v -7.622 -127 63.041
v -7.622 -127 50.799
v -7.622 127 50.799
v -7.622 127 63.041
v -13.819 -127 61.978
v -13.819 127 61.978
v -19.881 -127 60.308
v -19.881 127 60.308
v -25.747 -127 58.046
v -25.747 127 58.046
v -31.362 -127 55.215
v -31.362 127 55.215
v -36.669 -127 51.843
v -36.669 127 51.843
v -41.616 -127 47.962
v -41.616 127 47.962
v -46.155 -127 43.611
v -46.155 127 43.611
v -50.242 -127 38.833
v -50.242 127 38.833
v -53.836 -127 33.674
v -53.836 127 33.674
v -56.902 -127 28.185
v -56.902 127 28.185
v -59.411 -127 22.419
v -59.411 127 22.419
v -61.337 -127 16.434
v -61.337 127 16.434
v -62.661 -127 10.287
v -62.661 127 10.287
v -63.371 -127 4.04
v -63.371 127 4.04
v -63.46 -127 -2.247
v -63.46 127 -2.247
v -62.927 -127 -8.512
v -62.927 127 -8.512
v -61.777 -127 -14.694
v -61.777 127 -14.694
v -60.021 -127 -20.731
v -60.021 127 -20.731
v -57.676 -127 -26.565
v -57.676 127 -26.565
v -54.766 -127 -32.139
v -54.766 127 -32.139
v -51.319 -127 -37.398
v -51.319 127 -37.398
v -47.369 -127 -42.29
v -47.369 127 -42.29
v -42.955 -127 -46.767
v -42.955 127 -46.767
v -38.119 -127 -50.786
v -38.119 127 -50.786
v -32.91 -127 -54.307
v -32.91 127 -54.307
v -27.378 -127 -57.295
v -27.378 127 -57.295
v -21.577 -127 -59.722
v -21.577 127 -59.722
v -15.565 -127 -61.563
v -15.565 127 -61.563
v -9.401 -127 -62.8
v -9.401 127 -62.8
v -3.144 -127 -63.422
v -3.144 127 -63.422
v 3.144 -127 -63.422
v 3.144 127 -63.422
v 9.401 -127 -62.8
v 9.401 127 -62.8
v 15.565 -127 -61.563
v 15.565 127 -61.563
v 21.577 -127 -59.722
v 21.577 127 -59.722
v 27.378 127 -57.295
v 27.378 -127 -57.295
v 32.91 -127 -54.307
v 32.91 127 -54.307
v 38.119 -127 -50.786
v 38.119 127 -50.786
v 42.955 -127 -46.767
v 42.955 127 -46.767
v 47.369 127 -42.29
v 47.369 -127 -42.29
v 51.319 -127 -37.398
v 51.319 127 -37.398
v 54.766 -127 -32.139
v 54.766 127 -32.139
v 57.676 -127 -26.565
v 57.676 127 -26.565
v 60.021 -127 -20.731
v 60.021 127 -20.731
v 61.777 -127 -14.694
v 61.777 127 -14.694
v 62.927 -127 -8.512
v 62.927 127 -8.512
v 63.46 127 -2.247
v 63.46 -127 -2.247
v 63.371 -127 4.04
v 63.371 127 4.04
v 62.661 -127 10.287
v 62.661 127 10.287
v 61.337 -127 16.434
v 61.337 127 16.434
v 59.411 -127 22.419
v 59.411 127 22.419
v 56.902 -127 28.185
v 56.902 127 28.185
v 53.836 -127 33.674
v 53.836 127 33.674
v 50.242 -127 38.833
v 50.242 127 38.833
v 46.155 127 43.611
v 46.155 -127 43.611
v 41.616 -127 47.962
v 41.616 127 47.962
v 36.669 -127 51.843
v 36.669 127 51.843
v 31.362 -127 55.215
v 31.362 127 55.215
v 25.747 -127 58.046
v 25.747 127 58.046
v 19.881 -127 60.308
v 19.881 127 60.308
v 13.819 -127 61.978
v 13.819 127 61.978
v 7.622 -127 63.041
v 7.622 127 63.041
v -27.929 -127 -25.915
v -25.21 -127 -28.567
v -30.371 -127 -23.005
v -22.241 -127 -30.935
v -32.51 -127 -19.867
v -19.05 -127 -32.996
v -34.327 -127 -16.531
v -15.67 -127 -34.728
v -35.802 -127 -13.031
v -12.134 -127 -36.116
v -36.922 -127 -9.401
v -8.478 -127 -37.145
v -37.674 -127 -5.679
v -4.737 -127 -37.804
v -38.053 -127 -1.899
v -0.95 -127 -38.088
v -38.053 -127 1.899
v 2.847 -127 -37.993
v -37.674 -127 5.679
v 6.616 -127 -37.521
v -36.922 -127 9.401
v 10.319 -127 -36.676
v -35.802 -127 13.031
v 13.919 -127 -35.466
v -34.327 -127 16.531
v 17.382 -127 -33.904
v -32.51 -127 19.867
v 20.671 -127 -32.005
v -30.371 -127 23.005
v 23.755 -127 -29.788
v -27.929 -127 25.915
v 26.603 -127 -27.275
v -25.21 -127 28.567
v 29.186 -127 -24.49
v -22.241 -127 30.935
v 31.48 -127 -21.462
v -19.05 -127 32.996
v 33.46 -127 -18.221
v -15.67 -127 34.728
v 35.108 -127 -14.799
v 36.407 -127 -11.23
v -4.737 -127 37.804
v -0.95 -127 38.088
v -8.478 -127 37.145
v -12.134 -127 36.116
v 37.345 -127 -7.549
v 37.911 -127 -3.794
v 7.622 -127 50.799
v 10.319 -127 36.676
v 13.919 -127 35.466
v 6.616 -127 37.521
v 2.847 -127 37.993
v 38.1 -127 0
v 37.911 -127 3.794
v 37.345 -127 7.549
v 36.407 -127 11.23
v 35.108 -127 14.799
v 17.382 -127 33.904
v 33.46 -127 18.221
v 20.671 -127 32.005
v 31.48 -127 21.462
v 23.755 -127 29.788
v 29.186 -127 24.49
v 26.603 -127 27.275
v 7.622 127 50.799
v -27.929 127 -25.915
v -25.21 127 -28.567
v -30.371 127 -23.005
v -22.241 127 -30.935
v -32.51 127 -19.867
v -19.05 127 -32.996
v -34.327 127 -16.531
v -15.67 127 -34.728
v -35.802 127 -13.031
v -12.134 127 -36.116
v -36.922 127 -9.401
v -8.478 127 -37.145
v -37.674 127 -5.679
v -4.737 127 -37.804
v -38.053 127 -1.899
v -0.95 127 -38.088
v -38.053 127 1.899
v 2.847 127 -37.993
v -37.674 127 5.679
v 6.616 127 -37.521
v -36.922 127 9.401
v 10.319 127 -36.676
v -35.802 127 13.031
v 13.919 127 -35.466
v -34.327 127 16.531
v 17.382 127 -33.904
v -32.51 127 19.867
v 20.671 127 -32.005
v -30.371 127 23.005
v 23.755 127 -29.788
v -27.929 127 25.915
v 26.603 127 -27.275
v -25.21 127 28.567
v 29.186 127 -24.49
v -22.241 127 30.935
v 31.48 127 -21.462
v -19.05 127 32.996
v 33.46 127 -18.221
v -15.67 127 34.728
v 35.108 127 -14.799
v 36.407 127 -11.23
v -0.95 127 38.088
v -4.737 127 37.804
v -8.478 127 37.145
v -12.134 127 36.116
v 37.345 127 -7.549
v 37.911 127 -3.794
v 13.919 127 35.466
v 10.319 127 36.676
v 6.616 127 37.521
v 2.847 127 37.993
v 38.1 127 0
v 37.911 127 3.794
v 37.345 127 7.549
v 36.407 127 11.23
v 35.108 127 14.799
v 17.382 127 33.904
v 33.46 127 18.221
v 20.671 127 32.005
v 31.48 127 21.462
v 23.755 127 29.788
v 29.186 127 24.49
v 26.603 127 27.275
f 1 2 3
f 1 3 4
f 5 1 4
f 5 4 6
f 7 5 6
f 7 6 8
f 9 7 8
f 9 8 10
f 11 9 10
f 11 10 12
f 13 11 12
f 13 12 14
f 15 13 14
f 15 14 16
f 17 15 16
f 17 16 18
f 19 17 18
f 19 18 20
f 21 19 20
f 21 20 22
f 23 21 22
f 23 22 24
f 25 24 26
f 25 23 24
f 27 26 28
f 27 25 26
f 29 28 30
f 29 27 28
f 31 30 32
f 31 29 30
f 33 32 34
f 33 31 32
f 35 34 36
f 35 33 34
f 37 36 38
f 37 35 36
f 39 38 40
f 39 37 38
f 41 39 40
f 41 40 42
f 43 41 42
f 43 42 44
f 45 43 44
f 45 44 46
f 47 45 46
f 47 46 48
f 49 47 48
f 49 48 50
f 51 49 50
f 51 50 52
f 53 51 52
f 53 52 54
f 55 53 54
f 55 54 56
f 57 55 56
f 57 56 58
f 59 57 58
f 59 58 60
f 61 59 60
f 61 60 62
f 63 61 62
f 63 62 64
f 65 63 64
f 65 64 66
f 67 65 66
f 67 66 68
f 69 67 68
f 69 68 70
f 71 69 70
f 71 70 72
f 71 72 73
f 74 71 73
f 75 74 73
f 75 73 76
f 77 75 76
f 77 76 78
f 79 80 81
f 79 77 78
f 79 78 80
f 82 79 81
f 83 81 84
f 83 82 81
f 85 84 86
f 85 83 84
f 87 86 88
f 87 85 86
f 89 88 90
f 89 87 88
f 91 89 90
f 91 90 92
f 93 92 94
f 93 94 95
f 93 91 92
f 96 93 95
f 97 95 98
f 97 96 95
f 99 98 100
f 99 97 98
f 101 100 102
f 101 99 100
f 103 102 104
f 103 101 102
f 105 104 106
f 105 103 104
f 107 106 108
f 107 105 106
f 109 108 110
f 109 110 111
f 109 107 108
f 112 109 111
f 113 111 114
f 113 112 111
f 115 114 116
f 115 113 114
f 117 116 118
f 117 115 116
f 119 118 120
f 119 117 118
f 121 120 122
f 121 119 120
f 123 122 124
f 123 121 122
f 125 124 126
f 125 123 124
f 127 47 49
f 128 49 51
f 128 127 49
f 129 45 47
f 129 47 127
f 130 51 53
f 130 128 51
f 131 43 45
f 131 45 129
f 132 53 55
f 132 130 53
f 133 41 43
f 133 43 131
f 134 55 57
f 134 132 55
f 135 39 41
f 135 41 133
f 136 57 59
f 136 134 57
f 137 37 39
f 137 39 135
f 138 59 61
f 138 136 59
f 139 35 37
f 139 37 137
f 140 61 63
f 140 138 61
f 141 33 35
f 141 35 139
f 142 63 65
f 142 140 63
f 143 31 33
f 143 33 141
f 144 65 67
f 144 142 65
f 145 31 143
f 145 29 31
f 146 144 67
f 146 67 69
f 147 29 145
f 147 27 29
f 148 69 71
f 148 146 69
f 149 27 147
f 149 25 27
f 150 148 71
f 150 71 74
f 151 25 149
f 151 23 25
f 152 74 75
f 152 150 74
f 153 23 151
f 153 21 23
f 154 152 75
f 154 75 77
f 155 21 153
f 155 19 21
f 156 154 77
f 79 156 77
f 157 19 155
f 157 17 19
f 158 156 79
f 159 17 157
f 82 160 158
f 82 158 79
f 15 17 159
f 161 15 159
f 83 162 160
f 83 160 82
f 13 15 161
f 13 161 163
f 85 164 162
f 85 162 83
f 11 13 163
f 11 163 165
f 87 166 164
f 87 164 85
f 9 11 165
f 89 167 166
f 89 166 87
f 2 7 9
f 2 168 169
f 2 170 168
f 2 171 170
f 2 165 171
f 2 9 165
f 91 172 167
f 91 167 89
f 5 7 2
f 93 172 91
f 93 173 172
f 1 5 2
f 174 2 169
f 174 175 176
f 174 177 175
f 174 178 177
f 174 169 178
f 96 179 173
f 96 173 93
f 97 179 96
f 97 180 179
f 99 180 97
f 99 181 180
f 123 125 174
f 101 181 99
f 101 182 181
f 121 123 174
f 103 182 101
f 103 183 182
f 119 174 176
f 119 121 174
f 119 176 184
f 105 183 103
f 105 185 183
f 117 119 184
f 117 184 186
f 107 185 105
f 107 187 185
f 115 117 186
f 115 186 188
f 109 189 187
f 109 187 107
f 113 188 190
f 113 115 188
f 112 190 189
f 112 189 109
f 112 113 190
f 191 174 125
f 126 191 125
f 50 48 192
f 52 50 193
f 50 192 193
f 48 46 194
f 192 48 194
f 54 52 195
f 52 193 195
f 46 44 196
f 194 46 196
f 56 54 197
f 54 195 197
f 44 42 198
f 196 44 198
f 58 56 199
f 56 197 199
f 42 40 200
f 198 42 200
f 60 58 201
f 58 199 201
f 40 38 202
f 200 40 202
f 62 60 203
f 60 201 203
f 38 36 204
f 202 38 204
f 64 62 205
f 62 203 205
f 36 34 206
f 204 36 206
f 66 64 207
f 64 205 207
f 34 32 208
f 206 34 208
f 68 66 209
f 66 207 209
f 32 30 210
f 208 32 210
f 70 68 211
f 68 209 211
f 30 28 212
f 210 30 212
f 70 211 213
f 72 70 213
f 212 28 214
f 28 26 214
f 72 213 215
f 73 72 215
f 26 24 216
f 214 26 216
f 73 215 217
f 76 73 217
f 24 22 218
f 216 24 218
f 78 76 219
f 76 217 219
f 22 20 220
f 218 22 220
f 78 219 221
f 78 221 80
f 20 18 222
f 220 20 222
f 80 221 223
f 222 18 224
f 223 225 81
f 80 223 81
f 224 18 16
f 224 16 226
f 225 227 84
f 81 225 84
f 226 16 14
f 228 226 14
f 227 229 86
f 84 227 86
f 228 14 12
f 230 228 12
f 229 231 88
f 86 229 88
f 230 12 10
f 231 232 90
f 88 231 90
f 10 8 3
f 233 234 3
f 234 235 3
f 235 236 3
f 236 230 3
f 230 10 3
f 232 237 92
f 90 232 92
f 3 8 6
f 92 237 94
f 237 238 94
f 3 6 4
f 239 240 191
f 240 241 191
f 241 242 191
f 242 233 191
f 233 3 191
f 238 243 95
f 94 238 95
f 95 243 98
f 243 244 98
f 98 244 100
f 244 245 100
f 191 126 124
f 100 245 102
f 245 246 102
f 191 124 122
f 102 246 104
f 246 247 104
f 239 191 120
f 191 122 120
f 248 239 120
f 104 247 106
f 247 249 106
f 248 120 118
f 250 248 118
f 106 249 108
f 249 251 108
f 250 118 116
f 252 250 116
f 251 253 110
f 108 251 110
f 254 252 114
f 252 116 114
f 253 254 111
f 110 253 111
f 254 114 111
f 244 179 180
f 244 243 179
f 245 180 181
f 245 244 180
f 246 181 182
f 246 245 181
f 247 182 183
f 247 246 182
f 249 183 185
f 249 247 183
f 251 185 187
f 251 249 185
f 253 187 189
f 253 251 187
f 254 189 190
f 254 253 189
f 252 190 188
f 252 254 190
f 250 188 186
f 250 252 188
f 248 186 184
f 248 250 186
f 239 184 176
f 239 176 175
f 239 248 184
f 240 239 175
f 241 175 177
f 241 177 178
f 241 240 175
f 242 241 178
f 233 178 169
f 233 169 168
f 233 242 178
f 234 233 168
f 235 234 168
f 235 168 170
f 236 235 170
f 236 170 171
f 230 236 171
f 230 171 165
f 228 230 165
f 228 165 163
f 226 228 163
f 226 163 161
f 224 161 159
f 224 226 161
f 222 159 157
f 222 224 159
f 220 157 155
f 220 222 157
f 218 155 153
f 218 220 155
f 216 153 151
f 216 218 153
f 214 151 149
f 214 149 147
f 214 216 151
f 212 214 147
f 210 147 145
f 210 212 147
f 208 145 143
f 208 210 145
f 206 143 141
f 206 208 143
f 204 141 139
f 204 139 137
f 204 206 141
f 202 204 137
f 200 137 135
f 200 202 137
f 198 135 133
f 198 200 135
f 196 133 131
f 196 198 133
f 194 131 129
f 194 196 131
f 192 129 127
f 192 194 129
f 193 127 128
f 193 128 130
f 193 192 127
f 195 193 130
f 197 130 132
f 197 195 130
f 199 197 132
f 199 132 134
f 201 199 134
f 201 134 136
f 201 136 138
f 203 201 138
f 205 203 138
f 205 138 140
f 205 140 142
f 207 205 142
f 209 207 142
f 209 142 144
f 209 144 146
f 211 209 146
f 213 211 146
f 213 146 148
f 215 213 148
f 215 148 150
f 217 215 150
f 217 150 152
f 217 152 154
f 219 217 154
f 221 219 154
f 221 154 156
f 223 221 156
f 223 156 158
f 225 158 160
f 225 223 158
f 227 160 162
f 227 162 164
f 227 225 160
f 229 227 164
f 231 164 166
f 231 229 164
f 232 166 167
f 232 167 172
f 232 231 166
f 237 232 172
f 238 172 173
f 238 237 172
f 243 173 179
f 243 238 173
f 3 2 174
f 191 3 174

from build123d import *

# Parameters (mm, degrees)
F0_R          = 63.5
F0_R_2        = 38.1
F1_DEPTH      = 127
F1_DEPTH_BACK = 127
F2_W          = 15.243814
F2_H          = 25.401894
F3_DEPTH      = 254.001


with BuildPart() as f1:
    # F0 (on Front) → F1 (new body, two sides)
    with BuildSketch(Plane.XZ) as f1_sk:
        Circle(F0_R)
        Circle(F0_R_2, mode=Mode.SUBTRACT)
    extrude(amount=F1_DEPTH)
    extrude(f1_sk.sketch, amount=-F1_DEPTH_BACK)

    # F2 (on face) → F3 (cut, through all)
    with BuildSketch(Plane.XZ.offset(127)):
        with Locations((0, 63.5)):
            Rectangle(F2_W, F2_H)
    extrude(amount=-F3_DEPTH, mode=Mode.SUBTRACT)


solid = f1.part
